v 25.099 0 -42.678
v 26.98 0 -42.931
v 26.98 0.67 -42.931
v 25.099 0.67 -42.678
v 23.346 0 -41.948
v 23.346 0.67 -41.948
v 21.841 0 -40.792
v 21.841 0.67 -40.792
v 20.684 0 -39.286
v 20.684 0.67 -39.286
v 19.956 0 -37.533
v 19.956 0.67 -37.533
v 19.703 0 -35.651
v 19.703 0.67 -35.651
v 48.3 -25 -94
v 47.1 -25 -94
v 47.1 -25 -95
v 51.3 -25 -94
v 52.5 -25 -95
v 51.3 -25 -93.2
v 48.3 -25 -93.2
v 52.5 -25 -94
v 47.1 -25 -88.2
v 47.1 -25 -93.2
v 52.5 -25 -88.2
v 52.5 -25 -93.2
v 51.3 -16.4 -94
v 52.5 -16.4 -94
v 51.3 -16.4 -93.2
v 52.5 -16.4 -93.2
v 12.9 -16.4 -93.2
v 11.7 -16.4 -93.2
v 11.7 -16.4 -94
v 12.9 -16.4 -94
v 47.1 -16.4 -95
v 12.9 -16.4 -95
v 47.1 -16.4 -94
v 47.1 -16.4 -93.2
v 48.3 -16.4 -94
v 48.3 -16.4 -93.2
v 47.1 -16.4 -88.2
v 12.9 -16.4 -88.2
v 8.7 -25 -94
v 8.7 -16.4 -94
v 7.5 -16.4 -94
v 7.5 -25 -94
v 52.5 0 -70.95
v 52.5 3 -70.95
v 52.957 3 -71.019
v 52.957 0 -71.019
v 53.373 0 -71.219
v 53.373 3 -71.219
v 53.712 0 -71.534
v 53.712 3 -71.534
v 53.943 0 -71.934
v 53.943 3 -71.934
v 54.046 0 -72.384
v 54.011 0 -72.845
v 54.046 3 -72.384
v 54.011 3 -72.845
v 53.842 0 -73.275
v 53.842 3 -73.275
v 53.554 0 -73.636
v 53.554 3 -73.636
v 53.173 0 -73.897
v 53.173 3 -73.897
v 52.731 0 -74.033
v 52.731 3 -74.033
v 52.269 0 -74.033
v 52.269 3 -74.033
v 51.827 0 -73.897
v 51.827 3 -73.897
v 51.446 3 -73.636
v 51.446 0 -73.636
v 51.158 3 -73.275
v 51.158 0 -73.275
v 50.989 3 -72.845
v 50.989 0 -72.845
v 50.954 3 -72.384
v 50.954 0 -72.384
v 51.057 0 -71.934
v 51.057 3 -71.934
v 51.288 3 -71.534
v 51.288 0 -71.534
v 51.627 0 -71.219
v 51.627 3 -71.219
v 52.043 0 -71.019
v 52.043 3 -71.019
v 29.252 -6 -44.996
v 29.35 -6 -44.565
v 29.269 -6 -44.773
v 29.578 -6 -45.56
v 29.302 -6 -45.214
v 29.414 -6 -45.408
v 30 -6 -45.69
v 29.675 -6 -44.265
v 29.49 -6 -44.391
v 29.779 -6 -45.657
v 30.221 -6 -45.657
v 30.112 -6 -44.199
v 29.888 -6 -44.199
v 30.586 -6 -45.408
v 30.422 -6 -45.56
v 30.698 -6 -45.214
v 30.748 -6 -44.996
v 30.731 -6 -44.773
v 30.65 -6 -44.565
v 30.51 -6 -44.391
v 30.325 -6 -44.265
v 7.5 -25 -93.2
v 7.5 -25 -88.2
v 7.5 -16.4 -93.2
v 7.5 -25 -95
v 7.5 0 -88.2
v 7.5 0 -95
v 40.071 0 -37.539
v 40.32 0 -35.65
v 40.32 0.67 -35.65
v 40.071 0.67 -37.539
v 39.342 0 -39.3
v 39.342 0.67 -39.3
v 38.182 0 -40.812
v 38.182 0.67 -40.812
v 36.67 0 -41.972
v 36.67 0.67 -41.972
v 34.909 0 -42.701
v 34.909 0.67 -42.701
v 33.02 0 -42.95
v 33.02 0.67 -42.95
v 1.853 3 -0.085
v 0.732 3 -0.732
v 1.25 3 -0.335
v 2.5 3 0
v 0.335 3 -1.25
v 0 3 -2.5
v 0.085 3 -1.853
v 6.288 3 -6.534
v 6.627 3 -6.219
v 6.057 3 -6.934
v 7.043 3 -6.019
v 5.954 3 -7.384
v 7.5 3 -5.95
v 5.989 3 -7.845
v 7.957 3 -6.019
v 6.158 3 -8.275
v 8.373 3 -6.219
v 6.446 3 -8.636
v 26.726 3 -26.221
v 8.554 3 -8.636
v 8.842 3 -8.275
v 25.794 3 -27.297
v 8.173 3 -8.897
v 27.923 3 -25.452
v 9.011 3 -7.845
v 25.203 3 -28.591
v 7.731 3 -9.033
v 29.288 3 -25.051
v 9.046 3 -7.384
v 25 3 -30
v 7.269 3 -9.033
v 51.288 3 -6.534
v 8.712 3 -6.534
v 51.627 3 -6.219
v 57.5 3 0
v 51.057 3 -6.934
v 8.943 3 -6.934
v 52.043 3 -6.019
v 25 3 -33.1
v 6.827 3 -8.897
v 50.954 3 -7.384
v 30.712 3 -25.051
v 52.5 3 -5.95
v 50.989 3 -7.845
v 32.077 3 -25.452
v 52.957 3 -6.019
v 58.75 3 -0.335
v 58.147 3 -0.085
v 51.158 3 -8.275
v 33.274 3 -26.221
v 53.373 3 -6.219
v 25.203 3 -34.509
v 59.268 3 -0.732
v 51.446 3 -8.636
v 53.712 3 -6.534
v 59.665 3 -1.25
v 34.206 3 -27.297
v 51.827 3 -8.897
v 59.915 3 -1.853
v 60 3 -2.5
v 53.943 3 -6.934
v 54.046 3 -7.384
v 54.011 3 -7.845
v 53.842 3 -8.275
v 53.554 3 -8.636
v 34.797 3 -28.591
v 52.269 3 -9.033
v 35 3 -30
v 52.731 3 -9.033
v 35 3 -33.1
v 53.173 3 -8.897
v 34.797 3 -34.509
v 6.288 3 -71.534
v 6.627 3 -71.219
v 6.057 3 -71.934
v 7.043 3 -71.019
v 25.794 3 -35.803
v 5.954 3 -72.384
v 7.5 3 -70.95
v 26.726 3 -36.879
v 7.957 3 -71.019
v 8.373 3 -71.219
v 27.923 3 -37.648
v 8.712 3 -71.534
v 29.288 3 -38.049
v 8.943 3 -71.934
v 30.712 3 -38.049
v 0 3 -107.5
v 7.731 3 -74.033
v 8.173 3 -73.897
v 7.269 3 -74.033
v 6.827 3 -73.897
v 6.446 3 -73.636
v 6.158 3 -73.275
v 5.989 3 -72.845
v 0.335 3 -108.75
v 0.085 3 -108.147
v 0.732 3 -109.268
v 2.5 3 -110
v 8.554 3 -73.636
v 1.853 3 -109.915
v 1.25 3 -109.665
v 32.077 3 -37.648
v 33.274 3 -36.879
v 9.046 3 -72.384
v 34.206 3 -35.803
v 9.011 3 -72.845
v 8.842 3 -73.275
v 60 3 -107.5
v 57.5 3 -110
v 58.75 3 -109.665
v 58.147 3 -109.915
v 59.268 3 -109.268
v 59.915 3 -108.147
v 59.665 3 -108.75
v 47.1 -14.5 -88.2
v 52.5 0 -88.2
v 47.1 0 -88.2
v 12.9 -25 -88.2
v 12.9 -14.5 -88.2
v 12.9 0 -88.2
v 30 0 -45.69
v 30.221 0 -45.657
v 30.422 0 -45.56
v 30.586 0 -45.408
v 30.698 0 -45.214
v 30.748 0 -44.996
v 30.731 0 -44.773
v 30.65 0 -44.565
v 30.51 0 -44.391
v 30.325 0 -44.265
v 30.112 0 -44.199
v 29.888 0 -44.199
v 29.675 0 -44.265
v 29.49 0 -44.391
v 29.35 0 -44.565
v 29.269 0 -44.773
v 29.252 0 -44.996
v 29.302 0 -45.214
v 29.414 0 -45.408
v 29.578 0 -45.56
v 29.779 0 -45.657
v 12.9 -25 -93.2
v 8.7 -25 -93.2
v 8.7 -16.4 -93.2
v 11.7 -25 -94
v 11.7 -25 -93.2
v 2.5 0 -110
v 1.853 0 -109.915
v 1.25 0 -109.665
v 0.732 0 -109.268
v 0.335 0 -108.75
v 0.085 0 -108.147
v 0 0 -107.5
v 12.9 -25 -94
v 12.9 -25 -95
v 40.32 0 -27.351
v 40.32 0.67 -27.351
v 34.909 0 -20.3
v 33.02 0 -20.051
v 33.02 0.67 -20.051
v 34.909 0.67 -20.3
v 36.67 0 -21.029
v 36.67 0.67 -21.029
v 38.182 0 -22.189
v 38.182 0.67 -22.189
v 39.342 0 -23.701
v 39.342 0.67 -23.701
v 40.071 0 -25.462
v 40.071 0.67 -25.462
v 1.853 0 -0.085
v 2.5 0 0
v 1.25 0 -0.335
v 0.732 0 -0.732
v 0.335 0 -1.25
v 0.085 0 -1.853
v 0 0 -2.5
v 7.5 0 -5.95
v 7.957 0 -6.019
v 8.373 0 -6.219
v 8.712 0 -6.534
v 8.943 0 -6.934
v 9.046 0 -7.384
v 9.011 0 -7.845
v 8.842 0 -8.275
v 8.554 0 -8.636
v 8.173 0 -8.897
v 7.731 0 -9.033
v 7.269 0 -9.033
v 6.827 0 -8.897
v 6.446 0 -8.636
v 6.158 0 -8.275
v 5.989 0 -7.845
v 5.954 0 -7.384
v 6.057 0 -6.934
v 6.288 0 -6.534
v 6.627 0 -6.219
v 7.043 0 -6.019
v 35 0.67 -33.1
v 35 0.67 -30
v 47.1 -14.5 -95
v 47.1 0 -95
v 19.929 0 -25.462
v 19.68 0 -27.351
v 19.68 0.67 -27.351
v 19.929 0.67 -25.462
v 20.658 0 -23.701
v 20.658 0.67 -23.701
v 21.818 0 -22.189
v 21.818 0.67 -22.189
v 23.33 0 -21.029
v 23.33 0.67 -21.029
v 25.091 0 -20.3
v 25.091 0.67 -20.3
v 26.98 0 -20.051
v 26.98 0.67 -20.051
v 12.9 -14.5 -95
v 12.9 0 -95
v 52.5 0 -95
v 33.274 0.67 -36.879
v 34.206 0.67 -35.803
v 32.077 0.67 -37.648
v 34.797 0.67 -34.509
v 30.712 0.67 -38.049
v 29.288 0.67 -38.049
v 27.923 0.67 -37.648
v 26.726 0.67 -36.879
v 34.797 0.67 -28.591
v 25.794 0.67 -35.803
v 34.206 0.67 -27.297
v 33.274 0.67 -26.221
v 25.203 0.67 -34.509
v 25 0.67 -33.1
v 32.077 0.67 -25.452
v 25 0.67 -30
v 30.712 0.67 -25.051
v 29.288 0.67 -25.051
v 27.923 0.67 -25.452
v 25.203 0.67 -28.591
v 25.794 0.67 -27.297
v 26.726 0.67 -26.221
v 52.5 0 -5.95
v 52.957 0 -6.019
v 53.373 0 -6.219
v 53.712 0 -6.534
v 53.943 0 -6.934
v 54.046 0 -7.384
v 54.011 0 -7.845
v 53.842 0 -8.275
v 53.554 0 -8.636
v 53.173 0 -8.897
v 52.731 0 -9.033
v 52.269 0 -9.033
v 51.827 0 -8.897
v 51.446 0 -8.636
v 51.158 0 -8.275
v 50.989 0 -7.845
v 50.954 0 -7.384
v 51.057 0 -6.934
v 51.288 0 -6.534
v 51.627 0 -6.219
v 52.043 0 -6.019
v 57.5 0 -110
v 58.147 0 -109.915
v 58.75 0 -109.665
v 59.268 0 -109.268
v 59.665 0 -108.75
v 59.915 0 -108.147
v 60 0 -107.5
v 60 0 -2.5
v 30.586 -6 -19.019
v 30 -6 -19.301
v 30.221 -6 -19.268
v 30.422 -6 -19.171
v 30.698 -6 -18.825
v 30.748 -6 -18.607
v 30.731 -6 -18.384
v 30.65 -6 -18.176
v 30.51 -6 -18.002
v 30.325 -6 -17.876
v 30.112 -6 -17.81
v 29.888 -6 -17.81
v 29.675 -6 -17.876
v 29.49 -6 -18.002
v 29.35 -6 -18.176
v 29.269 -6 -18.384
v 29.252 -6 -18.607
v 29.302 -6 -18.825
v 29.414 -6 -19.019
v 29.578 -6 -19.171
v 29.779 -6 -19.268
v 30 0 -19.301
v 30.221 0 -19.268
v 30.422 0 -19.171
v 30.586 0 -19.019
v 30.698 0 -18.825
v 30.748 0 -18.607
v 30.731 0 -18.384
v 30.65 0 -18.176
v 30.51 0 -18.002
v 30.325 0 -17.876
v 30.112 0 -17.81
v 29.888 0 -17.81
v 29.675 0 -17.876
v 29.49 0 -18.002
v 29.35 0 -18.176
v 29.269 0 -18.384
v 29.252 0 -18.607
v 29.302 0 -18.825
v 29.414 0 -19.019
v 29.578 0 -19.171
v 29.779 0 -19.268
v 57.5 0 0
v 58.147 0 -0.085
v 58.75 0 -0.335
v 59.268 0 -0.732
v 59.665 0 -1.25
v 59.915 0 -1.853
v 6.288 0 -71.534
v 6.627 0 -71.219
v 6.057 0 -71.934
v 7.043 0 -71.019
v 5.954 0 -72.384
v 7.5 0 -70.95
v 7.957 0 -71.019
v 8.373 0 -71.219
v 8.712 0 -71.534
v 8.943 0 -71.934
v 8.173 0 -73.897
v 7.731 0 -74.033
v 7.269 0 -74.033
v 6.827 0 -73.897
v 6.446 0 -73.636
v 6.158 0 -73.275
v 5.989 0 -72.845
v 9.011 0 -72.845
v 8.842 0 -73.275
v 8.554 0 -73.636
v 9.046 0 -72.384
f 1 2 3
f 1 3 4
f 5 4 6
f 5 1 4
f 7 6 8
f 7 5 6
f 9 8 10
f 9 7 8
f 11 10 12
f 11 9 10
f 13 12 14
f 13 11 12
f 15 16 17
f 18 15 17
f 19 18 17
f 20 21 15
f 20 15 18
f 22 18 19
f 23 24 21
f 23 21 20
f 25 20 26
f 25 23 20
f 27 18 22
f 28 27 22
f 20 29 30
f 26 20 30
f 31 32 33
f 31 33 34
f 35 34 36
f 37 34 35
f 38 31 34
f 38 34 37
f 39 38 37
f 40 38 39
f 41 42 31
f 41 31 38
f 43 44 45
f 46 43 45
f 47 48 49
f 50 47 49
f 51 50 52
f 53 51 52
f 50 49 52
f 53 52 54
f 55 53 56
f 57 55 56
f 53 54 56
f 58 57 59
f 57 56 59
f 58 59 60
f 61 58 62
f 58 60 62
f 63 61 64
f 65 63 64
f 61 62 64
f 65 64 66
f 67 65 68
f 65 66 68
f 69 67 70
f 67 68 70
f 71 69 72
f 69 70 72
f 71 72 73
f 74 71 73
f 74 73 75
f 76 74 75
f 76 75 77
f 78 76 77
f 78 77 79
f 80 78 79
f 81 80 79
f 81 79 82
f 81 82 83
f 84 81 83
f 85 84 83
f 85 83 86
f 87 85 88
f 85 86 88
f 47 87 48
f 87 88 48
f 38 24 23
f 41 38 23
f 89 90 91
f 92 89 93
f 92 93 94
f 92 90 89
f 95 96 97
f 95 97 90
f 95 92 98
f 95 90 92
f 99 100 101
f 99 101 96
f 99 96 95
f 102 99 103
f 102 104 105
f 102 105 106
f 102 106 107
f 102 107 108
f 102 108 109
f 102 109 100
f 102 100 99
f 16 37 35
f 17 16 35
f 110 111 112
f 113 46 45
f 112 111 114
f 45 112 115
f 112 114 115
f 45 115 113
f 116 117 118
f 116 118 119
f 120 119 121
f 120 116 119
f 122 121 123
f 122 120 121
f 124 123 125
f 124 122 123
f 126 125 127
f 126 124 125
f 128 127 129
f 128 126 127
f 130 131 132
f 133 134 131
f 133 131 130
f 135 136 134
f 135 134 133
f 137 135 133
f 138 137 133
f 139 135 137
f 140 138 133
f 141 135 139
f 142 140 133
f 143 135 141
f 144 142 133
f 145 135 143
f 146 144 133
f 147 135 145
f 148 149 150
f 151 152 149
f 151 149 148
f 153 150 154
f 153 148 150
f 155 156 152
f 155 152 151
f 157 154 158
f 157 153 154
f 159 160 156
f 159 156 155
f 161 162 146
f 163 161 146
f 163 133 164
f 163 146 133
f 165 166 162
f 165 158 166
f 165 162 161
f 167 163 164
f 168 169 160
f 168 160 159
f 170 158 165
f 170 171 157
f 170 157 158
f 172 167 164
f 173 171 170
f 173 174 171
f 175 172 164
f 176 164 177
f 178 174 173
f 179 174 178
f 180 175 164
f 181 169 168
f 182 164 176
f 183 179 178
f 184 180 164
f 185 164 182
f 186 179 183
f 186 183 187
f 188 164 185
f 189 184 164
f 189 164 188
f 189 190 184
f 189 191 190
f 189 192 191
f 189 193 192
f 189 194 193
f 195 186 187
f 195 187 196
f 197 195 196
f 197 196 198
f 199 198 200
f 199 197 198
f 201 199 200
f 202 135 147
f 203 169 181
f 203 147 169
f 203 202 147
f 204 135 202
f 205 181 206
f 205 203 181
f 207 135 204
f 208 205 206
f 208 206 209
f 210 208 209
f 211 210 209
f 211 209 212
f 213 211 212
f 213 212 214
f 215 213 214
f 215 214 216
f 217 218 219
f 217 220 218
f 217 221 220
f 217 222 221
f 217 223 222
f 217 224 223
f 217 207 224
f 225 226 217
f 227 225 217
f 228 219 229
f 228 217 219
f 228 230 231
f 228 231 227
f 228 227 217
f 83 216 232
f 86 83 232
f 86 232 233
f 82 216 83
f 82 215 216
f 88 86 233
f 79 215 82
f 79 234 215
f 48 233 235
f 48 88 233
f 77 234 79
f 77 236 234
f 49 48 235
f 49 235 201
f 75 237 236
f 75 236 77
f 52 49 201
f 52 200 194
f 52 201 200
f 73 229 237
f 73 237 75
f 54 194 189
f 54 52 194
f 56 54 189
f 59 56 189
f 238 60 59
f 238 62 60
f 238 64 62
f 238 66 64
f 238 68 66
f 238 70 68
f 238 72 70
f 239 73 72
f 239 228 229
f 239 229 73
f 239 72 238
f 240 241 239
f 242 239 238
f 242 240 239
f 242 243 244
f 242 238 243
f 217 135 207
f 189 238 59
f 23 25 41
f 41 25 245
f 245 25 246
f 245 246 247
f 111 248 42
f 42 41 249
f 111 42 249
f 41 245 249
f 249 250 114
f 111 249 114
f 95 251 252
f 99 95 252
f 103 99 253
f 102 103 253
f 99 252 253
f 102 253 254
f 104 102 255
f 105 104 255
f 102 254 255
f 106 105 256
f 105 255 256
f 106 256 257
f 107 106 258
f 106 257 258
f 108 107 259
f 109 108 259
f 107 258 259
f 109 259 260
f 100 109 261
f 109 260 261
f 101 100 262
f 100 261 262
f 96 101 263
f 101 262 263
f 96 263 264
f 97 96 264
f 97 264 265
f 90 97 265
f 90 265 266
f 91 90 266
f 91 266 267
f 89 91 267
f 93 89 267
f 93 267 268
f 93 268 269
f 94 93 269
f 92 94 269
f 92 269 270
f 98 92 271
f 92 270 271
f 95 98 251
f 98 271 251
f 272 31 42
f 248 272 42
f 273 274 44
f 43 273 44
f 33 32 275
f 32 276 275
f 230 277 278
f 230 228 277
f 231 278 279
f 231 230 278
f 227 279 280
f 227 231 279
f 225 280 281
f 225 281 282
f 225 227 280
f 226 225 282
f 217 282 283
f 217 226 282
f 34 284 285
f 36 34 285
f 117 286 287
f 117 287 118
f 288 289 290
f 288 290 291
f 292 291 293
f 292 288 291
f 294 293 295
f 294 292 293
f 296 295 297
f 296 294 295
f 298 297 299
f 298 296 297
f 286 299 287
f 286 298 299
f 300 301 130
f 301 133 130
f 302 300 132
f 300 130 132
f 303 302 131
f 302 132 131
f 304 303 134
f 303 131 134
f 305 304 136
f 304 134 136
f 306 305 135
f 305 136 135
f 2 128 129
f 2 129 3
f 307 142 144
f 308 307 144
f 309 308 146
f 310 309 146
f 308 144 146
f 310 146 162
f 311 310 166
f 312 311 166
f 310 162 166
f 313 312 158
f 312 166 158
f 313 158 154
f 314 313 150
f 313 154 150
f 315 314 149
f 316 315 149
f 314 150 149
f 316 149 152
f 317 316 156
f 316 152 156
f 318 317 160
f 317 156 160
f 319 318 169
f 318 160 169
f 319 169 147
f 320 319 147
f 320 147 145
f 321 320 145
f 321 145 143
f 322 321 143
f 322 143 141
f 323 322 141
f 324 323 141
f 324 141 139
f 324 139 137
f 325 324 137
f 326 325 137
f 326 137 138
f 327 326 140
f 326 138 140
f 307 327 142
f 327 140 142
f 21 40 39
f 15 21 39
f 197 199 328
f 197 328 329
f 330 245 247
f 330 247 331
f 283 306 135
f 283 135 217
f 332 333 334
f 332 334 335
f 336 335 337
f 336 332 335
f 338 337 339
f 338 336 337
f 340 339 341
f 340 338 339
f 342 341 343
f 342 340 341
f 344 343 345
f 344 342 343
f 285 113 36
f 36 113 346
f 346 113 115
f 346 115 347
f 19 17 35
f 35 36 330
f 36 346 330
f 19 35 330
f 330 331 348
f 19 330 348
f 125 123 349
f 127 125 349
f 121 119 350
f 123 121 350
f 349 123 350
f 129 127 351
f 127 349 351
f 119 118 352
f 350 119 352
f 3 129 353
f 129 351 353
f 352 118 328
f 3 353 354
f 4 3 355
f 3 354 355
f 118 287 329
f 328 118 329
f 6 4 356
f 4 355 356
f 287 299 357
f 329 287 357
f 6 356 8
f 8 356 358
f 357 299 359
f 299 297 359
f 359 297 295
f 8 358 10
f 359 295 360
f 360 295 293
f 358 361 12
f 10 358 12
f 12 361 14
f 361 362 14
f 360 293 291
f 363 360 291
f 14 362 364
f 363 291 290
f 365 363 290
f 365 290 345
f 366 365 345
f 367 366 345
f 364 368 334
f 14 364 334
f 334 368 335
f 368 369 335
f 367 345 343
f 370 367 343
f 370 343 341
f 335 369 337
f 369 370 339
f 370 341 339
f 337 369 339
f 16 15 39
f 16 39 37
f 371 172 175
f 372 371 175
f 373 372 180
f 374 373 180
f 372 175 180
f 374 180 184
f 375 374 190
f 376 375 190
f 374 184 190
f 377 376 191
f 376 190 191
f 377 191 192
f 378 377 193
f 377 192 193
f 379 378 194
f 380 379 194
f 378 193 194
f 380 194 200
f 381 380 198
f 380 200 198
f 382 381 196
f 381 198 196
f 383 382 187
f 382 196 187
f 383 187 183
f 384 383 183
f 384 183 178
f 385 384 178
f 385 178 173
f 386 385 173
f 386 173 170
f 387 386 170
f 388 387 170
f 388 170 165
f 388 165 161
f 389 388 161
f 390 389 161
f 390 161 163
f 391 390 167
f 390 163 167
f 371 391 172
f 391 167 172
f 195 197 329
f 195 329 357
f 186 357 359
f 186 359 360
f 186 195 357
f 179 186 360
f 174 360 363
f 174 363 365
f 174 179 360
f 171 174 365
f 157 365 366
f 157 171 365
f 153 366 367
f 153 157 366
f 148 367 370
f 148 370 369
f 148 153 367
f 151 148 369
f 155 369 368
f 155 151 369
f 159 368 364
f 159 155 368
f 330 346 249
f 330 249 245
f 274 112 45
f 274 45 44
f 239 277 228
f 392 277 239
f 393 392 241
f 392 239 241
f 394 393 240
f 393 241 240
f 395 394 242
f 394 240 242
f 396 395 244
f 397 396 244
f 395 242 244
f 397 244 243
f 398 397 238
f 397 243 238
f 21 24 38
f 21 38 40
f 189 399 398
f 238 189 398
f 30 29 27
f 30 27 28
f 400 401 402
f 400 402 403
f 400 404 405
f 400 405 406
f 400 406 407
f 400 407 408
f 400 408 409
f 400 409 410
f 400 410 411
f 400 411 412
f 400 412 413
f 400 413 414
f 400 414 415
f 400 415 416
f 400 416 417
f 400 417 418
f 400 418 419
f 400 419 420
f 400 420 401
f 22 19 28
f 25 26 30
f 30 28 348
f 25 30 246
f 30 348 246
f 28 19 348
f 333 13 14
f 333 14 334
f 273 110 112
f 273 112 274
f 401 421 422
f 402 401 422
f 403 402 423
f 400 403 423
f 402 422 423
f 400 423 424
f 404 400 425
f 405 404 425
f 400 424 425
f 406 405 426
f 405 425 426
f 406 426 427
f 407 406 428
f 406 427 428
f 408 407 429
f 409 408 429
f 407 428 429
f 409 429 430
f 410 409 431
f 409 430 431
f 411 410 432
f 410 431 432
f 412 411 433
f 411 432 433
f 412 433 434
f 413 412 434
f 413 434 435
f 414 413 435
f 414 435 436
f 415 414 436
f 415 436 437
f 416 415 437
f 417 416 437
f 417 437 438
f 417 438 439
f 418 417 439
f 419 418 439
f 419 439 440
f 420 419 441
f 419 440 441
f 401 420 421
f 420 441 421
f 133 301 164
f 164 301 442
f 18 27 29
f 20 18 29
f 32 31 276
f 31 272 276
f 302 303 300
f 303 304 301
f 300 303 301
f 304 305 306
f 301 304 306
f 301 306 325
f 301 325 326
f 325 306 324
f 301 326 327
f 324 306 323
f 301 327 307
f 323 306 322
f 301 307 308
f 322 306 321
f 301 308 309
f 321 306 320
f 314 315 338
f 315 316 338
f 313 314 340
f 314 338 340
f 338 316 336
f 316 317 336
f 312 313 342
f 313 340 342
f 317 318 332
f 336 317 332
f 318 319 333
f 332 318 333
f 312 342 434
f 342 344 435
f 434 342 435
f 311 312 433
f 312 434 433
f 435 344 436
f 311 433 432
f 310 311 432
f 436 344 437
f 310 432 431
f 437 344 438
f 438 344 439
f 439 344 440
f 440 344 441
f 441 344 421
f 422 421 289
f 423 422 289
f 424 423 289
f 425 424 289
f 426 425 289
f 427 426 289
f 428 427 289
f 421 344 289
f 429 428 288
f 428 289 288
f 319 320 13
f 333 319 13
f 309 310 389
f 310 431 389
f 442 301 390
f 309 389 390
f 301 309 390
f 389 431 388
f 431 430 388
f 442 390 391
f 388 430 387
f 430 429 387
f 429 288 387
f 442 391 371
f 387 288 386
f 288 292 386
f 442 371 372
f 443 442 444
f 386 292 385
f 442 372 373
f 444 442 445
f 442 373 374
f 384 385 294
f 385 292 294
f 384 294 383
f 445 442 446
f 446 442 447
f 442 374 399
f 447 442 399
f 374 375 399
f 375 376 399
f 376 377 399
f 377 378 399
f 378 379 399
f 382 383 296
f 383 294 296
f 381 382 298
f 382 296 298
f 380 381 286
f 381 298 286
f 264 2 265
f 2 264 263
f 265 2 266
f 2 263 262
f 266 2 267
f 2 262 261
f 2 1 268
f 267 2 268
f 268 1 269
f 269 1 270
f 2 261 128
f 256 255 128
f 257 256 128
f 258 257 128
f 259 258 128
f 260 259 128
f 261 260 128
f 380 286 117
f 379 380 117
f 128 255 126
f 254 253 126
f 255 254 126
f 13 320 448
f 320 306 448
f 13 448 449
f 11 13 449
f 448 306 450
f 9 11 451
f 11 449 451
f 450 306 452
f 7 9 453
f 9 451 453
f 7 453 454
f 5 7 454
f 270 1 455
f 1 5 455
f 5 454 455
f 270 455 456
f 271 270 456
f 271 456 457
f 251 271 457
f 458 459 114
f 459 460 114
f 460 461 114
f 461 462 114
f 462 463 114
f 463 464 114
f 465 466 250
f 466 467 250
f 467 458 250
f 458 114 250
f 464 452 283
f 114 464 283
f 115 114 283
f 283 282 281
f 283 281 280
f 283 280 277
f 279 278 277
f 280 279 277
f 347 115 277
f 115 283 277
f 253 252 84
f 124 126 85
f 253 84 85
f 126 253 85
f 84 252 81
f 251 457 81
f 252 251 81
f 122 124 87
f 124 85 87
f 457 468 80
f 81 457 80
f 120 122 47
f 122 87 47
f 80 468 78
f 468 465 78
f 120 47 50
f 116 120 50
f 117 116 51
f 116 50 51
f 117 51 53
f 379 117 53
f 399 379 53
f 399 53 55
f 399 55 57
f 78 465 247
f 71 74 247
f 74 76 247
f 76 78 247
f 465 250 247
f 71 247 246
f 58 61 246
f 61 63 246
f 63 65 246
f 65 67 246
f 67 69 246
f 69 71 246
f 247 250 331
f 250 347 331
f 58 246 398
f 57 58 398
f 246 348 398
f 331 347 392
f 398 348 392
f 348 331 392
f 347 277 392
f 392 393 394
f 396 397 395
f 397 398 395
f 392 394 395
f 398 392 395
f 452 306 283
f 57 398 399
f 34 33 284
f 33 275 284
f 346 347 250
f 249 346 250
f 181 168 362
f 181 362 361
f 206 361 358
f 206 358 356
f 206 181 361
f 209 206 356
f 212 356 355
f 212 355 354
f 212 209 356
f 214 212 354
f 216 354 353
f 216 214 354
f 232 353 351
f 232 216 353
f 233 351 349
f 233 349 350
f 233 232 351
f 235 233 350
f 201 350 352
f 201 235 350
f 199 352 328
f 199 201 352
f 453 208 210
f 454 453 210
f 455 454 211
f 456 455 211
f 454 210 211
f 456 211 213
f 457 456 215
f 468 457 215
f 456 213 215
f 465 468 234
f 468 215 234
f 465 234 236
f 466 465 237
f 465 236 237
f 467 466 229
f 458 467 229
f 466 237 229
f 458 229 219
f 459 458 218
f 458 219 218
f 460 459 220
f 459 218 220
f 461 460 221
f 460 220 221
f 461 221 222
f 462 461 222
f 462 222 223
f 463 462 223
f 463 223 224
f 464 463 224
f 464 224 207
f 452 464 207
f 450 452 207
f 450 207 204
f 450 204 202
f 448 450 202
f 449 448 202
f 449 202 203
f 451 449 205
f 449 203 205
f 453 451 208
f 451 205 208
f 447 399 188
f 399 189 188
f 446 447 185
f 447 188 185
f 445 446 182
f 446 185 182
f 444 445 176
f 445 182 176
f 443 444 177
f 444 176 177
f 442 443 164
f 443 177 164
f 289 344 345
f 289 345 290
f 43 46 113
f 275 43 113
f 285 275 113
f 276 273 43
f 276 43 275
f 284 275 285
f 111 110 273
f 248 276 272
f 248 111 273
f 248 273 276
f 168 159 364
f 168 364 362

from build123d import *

# Parameters (mm, degrees)
SKETCH1_W           = 60
SKETCH1_H           = 110
BOSS_EXTRUDE1_DEPTH = 3
SKETCH2_R           = 1.55
CUT_EXTRUDE1_DEPTH  = 3
CUT_EXTRUDE2_DEPTH  = 2.33
CUT_EXTRUDE3_DEPTH  = 0.67
BOSS_EXTRUDE3_DEPTH = 25
SKETCH9_W           = 45
SKETCH9_H           = 6.8
BOSS_EXTRUDE4_DEPTH = 2
SKETCH10_W          = 5.4
SKETCH10_H          = 6.8
BOSS_EXTRUDE5_DEPTH = 14.5
FILLET1_R           = 2.5
SKETCH11_R          = 0.75
BOSS_EXTRUDE6_DEPTH = 6
SKETCH12_W          = 1.2
SKETCH12_H          = 0.8
CUT_EXTRUDE4_DEPTH  = 0.1


with BuildPart() as part:
    # Sketch1 → Boss-Extrude1 (new body)
    with BuildSketch(Plane(origin=(0, 0, 0), x_dir=(1, 0, 0), z_dir=(0, 1, 0))):
        with Locations((30, 55)):
            Rectangle(SKETCH1_W, SKETCH1_H)
    extrude(amount=BOSS_EXTRUDE1_DEPTH)

    # Sketch2 → Cut-Extrude1 (cut)
    with BuildSketch(Plane(origin=(0, 3, 0), x_dir=(1, 0, 0), z_dir=(0, 1, 0))):
        with Locations(Location((7.5, 7.5, 0), (0, 0, 270))):
            Circle(SKETCH2_R)
        with Locations(Location((52.5, 7.5, 0), (0, 0, 270))):
            Circle(SKETCH2_R)
        with Locations(Location((7.5, 72.5, 0), (0, 0, 270))):
            Circle(SKETCH2_R)
        with Locations(Location((52.5, 72.5, 0), (0, 0, 270))):
            Circle(SKETCH2_R)
    extrude(amount=-CUT_EXTRUDE1_DEPTH, mode=Mode.SUBTRACT)

    # Sketch3 → Cut-Extrude2 (cut)
    with BuildSketch(Plane(origin=(0, 3, 0), x_dir=(1, 0, 0), z_dir=(0, 1, 0))):
        with BuildLine():
            Line((35, 33.1), (35, 30))
            ThreePointArc((35, 30), (30, 25), (25, 30))
            Line((25, 30), (25, 33.1))
            ThreePointArc((25, 33.1), (30, 38.1), (35, 33.1))
        make_face()
    extrude(amount=-CUT_EXTRUDE2_DEPTH, mode=Mode.SUBTRACT)

    # Sketch4 → Cut-Extrude3 (cut)
    with BuildSketch(Plane.XZ):
        with BuildLine():
            Line((26.98, -20.051339235), (33.02, -20.051339235))
            ThreePointArc((33.02, -20.051339235), (38.181879503, -22.189459733), (40.32, -27.351339235))
            Line((40.32, -27.351339235), (40.32, -35.65))
            ThreePointArc((40.32, -35.65), (38.181879503, -40.811879503), (33.02, -42.95))
            Line((33.02, -42.95), (26.980030862, -42.930691587))
            ThreePointArc((26.980030862, -42.930691587), (21.840512337, -40.791632856), (19.703396192, -35.65130626))
            Line((19.703396192, -35.65130626), (19.68, -27.351339235))
            ThreePointArc((19.68, -27.351339235), (21.818120497, -22.189459733), (26.98, -20.051339235))
        make_face()
    extrude(amount=-CUT_EXTRUDE3_DEPTH, mode=Mode.SUBTRACT)

    # Sketch6 → Boss-Extrude3 (add)
    with BuildSketch(Plane.XZ):
        Polygon((51.3, -93.2), (52.5, -93.2), (52.5, -88.2), (47.1, -88.2), (47.1, -93.2), (48.3, -93.2), (48.3, -94), (47.1, -94), (47.1, -95), (52.5, -95), (52.5, -94), (51.3, -94), align=None)
        Polygon((11.7, -93.2), (12.9, -93.2), (12.9, -88.2), (7.5, -88.2), (7.5, -93.2), (8.7, -93.2), (8.7, -94), (7.5, -94), (7.5, -95), (12.9, -95), (12.9, -94), (11.7, -94), align=None)
    extrude(amount=BOSS_EXTRUDE3_DEPTH)

    # Sketch9 → Boss-Extrude4 (add)
    with BuildSketch(Plane(origin=(0, -16.5, 0), x_dir=(1, 0, 0), z_dir=(0, 1, 0))):
        with Locations((30, 91.6)):
            Rectangle(SKETCH9_W, SKETCH9_H)
    extrude(amount=BOSS_EXTRUDE4_DEPTH)

    # Sketch10 → Boss-Extrude5 (add)
    with BuildSketch(Plane.XZ):
        with Locations((10.2, -91.6)):
            Rectangle(SKETCH10_W, SKETCH10_H)
        with Locations((49.8, -91.6)):
            Rectangle(SKETCH10_W, SKETCH10_H)
    extrude(amount=BOSS_EXTRUDE5_DEPTH)

    # Fillet1
    fillet1_edges = [part.edges().sort_by_distance(p)[0] for p in [
        (0, 1.5, -110),
        (60, 1.5, -110),
        (60, 1.5, 0),
        (0, 1.5, 0),
    ]]
    fillet(fillet1_edges, radius=FILLET1_R)

    # Sketch11 → Boss-Extrude6 (add)
    with BuildSketch(Plane.XZ):
        with Locations(Location((30, -18.551339235, 0), (0, 0, 270))):
            Circle(SKETCH11_R)
        with Locations(Location((30, -44.940355963, 0), (0, 0, 270))):
            Circle(SKETCH11_R)
    extrude(amount=BOSS_EXTRUDE6_DEPTH)

    # Sketch12 → Cut-Extrude4 (cut)
    with BuildSketch(Plane.XZ.offset(16.5)):
        Polygon((12.9, -94), (12.9, -95), (47.1, -95), (47.1, -94), (48.3, -94), (48.3, -93.2), (47.1, -93.2), (47.1, -88.2), (12.9, -88.2), (12.9, -93.2), (11.7, -93.2), (11.7, -94), align=None)
        with Locations((8.1, -93.6)):
            Rectangle(SKETCH12_W, SKETCH12_H)
        with Locations((51.9, -93.6)):
            Rectangle(SKETCH12_W, SKETCH12_H)
    extrude(amount=-CUT_EXTRUDE4_DEPTH, mode=Mode.SUBTRACT)


solid = part.part
